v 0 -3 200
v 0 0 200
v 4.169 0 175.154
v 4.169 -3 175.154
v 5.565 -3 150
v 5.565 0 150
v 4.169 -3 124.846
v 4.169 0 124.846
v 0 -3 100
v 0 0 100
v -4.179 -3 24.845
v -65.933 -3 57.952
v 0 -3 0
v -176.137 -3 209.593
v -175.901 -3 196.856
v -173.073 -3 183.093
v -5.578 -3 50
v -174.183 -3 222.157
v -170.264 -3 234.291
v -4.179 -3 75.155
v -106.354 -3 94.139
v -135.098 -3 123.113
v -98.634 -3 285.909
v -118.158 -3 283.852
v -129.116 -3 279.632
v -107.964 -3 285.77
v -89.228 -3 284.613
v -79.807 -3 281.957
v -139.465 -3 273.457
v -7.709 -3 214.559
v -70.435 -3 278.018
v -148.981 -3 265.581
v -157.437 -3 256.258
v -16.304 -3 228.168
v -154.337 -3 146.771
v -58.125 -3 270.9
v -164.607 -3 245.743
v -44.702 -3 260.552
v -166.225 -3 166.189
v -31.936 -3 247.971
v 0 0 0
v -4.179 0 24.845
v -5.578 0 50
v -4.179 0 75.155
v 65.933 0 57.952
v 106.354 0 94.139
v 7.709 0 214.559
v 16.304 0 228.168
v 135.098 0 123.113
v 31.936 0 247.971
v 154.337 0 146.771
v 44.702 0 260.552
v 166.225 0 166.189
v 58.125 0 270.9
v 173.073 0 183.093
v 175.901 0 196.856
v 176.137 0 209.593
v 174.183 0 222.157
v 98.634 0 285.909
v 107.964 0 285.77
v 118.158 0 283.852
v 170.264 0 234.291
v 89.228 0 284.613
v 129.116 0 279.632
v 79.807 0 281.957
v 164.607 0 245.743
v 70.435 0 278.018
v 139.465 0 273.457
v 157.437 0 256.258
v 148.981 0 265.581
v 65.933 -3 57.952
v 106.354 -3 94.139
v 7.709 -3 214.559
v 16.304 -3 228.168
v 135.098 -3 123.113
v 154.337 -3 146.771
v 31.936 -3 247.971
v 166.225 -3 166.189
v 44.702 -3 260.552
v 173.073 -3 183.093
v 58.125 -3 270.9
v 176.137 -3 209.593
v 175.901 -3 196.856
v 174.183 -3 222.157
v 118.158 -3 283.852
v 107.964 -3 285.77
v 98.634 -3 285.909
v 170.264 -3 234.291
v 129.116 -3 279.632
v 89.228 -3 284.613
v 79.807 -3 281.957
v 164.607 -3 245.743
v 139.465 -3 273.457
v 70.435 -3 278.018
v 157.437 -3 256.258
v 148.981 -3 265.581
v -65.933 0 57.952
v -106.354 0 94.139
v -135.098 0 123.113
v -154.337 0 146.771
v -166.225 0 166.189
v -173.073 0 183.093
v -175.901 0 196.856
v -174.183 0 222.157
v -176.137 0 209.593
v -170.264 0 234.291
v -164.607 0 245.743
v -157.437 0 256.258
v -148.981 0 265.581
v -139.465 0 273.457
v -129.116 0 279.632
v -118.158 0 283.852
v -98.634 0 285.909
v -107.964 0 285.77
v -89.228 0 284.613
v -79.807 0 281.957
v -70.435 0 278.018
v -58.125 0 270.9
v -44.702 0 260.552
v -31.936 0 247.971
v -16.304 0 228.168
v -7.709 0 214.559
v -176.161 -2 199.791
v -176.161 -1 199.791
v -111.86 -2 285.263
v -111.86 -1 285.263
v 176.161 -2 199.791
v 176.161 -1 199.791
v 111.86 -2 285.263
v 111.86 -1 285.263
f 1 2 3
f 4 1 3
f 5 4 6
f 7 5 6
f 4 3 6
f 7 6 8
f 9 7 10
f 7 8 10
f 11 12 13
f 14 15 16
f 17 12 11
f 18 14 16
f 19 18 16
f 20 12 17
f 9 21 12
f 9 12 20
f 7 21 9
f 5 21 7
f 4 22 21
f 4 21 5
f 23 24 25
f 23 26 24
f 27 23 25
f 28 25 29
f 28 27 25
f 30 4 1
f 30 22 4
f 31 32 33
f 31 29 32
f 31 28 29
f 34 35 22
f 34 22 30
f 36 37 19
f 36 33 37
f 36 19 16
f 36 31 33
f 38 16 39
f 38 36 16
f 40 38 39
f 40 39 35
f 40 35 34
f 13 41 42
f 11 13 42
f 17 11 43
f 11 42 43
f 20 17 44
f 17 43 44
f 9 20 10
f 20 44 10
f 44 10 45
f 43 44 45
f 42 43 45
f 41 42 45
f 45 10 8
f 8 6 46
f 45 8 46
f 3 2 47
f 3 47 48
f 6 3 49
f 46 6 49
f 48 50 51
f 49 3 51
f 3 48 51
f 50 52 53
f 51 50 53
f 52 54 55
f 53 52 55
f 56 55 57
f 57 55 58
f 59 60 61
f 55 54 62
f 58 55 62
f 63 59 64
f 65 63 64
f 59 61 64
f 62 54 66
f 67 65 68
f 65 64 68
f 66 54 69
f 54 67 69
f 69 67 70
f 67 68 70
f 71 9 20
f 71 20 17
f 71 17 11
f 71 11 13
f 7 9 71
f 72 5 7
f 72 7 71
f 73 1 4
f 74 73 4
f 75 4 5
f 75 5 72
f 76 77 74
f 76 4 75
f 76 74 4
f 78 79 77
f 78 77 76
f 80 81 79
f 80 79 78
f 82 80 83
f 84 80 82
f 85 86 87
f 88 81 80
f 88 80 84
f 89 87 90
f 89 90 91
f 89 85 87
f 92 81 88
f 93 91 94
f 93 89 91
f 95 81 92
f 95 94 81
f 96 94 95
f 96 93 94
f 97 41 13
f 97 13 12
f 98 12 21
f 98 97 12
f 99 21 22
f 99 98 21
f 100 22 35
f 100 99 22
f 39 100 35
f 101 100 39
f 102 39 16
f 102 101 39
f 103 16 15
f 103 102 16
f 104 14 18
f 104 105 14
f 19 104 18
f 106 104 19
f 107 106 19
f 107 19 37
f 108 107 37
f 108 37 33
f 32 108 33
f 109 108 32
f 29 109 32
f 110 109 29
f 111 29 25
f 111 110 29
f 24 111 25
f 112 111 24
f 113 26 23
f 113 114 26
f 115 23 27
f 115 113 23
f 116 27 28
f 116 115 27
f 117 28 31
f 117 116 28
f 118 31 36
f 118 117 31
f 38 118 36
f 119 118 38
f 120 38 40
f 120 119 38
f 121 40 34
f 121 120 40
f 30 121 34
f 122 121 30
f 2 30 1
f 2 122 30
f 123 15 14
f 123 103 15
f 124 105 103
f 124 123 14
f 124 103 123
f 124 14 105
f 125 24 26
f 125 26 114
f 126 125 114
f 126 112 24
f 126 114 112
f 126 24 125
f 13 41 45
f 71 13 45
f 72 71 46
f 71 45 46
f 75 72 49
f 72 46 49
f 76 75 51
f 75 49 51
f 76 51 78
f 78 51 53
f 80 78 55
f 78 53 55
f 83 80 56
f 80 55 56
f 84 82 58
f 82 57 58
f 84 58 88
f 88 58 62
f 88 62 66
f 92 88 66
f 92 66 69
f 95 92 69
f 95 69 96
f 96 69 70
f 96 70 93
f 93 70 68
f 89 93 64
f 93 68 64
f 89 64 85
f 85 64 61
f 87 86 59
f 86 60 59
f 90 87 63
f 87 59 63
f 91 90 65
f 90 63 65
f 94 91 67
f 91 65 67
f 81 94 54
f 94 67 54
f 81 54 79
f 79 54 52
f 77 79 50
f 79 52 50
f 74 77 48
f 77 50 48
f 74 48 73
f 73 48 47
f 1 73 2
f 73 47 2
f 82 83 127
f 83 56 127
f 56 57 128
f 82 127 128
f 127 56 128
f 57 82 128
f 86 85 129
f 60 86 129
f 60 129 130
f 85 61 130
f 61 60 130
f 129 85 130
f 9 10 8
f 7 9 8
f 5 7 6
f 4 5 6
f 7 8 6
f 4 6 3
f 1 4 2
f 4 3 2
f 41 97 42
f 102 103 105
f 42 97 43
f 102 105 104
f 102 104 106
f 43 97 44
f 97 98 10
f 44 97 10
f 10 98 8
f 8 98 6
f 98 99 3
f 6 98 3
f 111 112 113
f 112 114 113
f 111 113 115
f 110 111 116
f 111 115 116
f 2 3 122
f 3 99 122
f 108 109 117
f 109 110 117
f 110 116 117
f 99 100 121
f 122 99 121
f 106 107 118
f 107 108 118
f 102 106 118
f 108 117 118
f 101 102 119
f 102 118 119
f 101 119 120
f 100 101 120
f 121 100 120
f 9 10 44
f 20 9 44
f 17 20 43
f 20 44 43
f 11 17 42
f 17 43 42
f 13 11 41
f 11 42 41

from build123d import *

# Parameters (mm, degrees)
F1_DEPTH = 3
F2_DEPTH = 3


# Not quite as in the source:
# - a feature names something its author has since deleted; it is built from what else it names


with BuildPart() as f1:
    # F0 (on Front) → F1 (new body)
    with BuildSketch(Plane.XZ):
        with BuildLine():
            Line((0, 100), (0, 0))
            add(Edge.make_bspline(
                [(0, 0), (82.3394819819, 75.4575862184), (228.7437395074, 176.365648432), (110.9191157227, 325.2390189646), (25.9574372763, 253.8398247218), (0, 200)],
                knots=[0, 0, 0, 0, 0.4236671268, 0.6921367272, 1, 1, 1, 1], degree=3))
            ThreePointArc((0, 200), (5.5646149333, 150), (0, 100))
        make_face()
        with BuildLine():
            ThreePointArc((0, 100), (-5.578394677, 50), (0, 0))
            Line((0, 0), (0, 100))
        make_face()
    extrude(amount=F1_DEPTH)


with BuildPart() as f2:
    # F0 (on Front) → F2 (new body)
    with BuildSketch(Plane.XZ):
        with BuildLine():
            ThreePointArc((0, 100), (5.5646149333, 150), (0, 200))
            Line((0, 200), (0, 100))
        make_face()
        with BuildLine():
            add(Edge.make_bspline(
                [(0, 0), (-82.3394819819, 75.4575862184), (-228.7437395074, 176.365648432), (-110.9191157227, 325.2390189646), (-25.9574372763, 253.8398247218), (0, 200)],
                knots=[0, 0, 0, 0, 0.4236671268, 0.6921367272, 1, 1, 1, 1], degree=3))
            ThreePointArc((0, 0), (-5.578394677, 50), (0, 100))
            Line((0, 100), (0, 200))
        make_face()
    extrude(amount=F2_DEPTH)


solid = Compound([f1.part, f2.part])
